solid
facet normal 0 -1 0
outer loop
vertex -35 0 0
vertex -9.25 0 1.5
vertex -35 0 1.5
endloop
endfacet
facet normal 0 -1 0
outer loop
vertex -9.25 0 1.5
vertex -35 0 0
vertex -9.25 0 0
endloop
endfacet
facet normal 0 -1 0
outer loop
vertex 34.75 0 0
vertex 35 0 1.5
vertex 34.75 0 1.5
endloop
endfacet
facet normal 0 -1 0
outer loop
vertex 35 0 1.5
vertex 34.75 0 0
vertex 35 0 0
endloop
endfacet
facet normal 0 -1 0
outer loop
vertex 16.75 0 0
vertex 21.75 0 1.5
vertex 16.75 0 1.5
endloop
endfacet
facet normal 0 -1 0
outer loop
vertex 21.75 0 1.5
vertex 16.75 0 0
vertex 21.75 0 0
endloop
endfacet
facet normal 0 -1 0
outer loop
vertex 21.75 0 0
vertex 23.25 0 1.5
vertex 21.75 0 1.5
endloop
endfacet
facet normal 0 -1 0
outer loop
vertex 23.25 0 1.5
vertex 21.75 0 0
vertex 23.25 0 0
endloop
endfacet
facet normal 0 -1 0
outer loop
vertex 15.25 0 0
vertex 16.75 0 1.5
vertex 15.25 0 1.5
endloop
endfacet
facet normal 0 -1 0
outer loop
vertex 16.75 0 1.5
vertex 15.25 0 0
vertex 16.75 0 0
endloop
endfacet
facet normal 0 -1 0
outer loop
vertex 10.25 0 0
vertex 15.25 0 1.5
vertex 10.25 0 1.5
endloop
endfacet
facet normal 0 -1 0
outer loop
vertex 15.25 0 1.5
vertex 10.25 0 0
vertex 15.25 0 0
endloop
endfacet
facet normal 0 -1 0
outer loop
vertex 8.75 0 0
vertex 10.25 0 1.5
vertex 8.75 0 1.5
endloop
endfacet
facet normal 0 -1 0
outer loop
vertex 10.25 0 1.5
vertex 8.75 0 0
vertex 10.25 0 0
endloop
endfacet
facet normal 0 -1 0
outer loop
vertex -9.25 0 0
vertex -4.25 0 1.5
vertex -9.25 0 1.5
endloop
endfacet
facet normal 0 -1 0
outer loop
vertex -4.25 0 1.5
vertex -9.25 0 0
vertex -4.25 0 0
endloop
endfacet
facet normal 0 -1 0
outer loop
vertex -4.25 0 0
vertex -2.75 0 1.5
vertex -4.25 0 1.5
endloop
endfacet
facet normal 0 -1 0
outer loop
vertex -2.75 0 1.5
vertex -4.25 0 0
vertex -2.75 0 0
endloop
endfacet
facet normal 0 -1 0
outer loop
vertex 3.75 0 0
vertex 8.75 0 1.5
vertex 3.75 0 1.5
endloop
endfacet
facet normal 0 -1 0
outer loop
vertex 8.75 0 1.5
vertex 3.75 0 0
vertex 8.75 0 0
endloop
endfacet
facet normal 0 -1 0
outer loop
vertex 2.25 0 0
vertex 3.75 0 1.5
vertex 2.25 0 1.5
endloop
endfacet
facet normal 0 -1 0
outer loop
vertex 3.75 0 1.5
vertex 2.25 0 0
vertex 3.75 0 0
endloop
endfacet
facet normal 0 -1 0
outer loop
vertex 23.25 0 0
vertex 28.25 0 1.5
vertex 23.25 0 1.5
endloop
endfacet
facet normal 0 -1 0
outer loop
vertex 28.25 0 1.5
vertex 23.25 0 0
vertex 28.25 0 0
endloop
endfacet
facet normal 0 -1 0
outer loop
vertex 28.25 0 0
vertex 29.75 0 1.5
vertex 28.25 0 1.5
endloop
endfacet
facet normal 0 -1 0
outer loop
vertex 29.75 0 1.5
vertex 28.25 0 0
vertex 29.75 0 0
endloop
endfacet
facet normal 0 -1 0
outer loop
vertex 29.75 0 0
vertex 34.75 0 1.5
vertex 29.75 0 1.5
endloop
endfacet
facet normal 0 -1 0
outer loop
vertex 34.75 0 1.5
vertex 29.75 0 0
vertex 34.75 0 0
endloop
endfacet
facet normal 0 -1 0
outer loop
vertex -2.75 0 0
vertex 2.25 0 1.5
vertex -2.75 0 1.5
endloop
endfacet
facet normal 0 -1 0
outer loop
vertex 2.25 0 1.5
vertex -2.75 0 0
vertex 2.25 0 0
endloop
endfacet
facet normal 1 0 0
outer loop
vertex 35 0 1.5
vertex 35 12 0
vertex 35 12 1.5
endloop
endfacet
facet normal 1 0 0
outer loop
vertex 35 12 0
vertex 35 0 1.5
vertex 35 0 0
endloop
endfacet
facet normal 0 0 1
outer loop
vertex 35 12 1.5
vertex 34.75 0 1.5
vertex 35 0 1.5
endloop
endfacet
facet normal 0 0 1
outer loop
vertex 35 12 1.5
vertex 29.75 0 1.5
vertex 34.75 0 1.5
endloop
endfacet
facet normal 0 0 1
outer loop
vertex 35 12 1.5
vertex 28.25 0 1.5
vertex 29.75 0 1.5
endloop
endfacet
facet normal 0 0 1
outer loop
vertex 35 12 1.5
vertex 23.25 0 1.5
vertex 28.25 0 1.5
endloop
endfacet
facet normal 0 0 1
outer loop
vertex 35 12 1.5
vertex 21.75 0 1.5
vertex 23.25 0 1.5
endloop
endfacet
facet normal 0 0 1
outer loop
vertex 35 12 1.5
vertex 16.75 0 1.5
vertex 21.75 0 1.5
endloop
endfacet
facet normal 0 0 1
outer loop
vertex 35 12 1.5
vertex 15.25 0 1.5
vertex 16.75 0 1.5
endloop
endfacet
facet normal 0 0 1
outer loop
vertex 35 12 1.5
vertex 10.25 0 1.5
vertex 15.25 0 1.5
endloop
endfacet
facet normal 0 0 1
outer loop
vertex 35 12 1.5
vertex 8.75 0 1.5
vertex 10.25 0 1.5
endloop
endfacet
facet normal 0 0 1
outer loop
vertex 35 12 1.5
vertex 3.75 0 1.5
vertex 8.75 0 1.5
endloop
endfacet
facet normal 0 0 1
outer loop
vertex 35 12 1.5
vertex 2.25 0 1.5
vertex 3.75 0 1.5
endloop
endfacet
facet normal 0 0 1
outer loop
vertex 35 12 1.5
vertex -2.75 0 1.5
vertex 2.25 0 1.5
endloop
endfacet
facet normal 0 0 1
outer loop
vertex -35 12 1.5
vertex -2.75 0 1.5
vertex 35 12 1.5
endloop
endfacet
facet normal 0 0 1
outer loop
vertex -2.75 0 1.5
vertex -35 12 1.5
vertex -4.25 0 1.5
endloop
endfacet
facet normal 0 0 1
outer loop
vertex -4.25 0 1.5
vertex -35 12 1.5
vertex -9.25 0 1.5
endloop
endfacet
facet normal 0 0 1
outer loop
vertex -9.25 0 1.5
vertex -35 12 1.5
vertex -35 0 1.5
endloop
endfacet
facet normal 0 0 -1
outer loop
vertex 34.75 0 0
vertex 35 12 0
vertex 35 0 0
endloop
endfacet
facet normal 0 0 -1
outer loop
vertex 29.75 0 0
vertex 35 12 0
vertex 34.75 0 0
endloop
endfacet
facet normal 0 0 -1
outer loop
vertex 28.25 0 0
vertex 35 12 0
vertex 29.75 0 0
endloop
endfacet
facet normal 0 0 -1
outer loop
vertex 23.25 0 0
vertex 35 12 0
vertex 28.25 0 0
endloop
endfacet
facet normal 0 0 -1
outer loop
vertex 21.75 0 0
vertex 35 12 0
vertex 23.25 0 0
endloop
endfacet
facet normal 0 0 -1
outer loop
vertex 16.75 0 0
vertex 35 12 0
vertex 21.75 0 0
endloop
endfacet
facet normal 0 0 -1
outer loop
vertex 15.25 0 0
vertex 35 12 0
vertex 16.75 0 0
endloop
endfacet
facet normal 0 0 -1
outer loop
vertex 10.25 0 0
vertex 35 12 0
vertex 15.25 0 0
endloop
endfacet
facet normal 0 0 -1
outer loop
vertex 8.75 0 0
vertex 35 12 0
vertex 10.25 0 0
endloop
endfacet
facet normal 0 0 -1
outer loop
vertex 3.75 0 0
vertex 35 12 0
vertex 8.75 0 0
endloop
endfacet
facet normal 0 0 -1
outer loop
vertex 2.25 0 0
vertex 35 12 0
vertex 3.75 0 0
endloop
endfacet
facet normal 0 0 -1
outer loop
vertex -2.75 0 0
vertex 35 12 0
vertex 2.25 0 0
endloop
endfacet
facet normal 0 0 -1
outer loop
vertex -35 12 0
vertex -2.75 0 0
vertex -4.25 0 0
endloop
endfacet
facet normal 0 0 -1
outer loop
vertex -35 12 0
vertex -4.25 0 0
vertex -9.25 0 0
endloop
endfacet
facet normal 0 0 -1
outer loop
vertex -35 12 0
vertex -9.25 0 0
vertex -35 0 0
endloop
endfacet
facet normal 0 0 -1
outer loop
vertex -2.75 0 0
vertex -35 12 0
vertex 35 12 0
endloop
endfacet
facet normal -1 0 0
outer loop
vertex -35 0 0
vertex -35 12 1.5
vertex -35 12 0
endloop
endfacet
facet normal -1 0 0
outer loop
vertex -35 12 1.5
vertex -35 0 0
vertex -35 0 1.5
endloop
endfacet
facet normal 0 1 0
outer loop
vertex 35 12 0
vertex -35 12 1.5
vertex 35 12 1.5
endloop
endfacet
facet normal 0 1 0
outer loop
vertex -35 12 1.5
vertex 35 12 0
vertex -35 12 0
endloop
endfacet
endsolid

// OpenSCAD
// 10-well comb for agarose gel casting, printed lying flat
// Units: mm

plate_t      = 1.5;   // plate thickness (Z)
spine_len    = 70;    // spine length (X)
spine_w      = 12;    // spine width (Y)
tooth_count  = 10;    // number of teeth
tooth_w      = 5.0;   // tooth width (X)
tooth_len    = 12;    // tooth length (Y)
gap          = 1.5;   // gap between teeth (X)
eps          = 0.5;   // cutter overshoot

$fn = 64;

pitch = tooth_w + gap;  // 6.5 mm
x0    = -(tooth_count - 1) * gap / 2;  // first tooth left edge

difference() {
    // Spine
    translate([-spine_len / 2, 0, 0])
        cube([spine_len, spine_w, plate_t]);

    // Teeth
    for (i = [0 : tooth_count - 1])
        translate([x0 + i * pitch - tooth_w / 2, -tooth_len, 0])
            cube([tooth_w, tooth_len, plate_t + eps]);
}
